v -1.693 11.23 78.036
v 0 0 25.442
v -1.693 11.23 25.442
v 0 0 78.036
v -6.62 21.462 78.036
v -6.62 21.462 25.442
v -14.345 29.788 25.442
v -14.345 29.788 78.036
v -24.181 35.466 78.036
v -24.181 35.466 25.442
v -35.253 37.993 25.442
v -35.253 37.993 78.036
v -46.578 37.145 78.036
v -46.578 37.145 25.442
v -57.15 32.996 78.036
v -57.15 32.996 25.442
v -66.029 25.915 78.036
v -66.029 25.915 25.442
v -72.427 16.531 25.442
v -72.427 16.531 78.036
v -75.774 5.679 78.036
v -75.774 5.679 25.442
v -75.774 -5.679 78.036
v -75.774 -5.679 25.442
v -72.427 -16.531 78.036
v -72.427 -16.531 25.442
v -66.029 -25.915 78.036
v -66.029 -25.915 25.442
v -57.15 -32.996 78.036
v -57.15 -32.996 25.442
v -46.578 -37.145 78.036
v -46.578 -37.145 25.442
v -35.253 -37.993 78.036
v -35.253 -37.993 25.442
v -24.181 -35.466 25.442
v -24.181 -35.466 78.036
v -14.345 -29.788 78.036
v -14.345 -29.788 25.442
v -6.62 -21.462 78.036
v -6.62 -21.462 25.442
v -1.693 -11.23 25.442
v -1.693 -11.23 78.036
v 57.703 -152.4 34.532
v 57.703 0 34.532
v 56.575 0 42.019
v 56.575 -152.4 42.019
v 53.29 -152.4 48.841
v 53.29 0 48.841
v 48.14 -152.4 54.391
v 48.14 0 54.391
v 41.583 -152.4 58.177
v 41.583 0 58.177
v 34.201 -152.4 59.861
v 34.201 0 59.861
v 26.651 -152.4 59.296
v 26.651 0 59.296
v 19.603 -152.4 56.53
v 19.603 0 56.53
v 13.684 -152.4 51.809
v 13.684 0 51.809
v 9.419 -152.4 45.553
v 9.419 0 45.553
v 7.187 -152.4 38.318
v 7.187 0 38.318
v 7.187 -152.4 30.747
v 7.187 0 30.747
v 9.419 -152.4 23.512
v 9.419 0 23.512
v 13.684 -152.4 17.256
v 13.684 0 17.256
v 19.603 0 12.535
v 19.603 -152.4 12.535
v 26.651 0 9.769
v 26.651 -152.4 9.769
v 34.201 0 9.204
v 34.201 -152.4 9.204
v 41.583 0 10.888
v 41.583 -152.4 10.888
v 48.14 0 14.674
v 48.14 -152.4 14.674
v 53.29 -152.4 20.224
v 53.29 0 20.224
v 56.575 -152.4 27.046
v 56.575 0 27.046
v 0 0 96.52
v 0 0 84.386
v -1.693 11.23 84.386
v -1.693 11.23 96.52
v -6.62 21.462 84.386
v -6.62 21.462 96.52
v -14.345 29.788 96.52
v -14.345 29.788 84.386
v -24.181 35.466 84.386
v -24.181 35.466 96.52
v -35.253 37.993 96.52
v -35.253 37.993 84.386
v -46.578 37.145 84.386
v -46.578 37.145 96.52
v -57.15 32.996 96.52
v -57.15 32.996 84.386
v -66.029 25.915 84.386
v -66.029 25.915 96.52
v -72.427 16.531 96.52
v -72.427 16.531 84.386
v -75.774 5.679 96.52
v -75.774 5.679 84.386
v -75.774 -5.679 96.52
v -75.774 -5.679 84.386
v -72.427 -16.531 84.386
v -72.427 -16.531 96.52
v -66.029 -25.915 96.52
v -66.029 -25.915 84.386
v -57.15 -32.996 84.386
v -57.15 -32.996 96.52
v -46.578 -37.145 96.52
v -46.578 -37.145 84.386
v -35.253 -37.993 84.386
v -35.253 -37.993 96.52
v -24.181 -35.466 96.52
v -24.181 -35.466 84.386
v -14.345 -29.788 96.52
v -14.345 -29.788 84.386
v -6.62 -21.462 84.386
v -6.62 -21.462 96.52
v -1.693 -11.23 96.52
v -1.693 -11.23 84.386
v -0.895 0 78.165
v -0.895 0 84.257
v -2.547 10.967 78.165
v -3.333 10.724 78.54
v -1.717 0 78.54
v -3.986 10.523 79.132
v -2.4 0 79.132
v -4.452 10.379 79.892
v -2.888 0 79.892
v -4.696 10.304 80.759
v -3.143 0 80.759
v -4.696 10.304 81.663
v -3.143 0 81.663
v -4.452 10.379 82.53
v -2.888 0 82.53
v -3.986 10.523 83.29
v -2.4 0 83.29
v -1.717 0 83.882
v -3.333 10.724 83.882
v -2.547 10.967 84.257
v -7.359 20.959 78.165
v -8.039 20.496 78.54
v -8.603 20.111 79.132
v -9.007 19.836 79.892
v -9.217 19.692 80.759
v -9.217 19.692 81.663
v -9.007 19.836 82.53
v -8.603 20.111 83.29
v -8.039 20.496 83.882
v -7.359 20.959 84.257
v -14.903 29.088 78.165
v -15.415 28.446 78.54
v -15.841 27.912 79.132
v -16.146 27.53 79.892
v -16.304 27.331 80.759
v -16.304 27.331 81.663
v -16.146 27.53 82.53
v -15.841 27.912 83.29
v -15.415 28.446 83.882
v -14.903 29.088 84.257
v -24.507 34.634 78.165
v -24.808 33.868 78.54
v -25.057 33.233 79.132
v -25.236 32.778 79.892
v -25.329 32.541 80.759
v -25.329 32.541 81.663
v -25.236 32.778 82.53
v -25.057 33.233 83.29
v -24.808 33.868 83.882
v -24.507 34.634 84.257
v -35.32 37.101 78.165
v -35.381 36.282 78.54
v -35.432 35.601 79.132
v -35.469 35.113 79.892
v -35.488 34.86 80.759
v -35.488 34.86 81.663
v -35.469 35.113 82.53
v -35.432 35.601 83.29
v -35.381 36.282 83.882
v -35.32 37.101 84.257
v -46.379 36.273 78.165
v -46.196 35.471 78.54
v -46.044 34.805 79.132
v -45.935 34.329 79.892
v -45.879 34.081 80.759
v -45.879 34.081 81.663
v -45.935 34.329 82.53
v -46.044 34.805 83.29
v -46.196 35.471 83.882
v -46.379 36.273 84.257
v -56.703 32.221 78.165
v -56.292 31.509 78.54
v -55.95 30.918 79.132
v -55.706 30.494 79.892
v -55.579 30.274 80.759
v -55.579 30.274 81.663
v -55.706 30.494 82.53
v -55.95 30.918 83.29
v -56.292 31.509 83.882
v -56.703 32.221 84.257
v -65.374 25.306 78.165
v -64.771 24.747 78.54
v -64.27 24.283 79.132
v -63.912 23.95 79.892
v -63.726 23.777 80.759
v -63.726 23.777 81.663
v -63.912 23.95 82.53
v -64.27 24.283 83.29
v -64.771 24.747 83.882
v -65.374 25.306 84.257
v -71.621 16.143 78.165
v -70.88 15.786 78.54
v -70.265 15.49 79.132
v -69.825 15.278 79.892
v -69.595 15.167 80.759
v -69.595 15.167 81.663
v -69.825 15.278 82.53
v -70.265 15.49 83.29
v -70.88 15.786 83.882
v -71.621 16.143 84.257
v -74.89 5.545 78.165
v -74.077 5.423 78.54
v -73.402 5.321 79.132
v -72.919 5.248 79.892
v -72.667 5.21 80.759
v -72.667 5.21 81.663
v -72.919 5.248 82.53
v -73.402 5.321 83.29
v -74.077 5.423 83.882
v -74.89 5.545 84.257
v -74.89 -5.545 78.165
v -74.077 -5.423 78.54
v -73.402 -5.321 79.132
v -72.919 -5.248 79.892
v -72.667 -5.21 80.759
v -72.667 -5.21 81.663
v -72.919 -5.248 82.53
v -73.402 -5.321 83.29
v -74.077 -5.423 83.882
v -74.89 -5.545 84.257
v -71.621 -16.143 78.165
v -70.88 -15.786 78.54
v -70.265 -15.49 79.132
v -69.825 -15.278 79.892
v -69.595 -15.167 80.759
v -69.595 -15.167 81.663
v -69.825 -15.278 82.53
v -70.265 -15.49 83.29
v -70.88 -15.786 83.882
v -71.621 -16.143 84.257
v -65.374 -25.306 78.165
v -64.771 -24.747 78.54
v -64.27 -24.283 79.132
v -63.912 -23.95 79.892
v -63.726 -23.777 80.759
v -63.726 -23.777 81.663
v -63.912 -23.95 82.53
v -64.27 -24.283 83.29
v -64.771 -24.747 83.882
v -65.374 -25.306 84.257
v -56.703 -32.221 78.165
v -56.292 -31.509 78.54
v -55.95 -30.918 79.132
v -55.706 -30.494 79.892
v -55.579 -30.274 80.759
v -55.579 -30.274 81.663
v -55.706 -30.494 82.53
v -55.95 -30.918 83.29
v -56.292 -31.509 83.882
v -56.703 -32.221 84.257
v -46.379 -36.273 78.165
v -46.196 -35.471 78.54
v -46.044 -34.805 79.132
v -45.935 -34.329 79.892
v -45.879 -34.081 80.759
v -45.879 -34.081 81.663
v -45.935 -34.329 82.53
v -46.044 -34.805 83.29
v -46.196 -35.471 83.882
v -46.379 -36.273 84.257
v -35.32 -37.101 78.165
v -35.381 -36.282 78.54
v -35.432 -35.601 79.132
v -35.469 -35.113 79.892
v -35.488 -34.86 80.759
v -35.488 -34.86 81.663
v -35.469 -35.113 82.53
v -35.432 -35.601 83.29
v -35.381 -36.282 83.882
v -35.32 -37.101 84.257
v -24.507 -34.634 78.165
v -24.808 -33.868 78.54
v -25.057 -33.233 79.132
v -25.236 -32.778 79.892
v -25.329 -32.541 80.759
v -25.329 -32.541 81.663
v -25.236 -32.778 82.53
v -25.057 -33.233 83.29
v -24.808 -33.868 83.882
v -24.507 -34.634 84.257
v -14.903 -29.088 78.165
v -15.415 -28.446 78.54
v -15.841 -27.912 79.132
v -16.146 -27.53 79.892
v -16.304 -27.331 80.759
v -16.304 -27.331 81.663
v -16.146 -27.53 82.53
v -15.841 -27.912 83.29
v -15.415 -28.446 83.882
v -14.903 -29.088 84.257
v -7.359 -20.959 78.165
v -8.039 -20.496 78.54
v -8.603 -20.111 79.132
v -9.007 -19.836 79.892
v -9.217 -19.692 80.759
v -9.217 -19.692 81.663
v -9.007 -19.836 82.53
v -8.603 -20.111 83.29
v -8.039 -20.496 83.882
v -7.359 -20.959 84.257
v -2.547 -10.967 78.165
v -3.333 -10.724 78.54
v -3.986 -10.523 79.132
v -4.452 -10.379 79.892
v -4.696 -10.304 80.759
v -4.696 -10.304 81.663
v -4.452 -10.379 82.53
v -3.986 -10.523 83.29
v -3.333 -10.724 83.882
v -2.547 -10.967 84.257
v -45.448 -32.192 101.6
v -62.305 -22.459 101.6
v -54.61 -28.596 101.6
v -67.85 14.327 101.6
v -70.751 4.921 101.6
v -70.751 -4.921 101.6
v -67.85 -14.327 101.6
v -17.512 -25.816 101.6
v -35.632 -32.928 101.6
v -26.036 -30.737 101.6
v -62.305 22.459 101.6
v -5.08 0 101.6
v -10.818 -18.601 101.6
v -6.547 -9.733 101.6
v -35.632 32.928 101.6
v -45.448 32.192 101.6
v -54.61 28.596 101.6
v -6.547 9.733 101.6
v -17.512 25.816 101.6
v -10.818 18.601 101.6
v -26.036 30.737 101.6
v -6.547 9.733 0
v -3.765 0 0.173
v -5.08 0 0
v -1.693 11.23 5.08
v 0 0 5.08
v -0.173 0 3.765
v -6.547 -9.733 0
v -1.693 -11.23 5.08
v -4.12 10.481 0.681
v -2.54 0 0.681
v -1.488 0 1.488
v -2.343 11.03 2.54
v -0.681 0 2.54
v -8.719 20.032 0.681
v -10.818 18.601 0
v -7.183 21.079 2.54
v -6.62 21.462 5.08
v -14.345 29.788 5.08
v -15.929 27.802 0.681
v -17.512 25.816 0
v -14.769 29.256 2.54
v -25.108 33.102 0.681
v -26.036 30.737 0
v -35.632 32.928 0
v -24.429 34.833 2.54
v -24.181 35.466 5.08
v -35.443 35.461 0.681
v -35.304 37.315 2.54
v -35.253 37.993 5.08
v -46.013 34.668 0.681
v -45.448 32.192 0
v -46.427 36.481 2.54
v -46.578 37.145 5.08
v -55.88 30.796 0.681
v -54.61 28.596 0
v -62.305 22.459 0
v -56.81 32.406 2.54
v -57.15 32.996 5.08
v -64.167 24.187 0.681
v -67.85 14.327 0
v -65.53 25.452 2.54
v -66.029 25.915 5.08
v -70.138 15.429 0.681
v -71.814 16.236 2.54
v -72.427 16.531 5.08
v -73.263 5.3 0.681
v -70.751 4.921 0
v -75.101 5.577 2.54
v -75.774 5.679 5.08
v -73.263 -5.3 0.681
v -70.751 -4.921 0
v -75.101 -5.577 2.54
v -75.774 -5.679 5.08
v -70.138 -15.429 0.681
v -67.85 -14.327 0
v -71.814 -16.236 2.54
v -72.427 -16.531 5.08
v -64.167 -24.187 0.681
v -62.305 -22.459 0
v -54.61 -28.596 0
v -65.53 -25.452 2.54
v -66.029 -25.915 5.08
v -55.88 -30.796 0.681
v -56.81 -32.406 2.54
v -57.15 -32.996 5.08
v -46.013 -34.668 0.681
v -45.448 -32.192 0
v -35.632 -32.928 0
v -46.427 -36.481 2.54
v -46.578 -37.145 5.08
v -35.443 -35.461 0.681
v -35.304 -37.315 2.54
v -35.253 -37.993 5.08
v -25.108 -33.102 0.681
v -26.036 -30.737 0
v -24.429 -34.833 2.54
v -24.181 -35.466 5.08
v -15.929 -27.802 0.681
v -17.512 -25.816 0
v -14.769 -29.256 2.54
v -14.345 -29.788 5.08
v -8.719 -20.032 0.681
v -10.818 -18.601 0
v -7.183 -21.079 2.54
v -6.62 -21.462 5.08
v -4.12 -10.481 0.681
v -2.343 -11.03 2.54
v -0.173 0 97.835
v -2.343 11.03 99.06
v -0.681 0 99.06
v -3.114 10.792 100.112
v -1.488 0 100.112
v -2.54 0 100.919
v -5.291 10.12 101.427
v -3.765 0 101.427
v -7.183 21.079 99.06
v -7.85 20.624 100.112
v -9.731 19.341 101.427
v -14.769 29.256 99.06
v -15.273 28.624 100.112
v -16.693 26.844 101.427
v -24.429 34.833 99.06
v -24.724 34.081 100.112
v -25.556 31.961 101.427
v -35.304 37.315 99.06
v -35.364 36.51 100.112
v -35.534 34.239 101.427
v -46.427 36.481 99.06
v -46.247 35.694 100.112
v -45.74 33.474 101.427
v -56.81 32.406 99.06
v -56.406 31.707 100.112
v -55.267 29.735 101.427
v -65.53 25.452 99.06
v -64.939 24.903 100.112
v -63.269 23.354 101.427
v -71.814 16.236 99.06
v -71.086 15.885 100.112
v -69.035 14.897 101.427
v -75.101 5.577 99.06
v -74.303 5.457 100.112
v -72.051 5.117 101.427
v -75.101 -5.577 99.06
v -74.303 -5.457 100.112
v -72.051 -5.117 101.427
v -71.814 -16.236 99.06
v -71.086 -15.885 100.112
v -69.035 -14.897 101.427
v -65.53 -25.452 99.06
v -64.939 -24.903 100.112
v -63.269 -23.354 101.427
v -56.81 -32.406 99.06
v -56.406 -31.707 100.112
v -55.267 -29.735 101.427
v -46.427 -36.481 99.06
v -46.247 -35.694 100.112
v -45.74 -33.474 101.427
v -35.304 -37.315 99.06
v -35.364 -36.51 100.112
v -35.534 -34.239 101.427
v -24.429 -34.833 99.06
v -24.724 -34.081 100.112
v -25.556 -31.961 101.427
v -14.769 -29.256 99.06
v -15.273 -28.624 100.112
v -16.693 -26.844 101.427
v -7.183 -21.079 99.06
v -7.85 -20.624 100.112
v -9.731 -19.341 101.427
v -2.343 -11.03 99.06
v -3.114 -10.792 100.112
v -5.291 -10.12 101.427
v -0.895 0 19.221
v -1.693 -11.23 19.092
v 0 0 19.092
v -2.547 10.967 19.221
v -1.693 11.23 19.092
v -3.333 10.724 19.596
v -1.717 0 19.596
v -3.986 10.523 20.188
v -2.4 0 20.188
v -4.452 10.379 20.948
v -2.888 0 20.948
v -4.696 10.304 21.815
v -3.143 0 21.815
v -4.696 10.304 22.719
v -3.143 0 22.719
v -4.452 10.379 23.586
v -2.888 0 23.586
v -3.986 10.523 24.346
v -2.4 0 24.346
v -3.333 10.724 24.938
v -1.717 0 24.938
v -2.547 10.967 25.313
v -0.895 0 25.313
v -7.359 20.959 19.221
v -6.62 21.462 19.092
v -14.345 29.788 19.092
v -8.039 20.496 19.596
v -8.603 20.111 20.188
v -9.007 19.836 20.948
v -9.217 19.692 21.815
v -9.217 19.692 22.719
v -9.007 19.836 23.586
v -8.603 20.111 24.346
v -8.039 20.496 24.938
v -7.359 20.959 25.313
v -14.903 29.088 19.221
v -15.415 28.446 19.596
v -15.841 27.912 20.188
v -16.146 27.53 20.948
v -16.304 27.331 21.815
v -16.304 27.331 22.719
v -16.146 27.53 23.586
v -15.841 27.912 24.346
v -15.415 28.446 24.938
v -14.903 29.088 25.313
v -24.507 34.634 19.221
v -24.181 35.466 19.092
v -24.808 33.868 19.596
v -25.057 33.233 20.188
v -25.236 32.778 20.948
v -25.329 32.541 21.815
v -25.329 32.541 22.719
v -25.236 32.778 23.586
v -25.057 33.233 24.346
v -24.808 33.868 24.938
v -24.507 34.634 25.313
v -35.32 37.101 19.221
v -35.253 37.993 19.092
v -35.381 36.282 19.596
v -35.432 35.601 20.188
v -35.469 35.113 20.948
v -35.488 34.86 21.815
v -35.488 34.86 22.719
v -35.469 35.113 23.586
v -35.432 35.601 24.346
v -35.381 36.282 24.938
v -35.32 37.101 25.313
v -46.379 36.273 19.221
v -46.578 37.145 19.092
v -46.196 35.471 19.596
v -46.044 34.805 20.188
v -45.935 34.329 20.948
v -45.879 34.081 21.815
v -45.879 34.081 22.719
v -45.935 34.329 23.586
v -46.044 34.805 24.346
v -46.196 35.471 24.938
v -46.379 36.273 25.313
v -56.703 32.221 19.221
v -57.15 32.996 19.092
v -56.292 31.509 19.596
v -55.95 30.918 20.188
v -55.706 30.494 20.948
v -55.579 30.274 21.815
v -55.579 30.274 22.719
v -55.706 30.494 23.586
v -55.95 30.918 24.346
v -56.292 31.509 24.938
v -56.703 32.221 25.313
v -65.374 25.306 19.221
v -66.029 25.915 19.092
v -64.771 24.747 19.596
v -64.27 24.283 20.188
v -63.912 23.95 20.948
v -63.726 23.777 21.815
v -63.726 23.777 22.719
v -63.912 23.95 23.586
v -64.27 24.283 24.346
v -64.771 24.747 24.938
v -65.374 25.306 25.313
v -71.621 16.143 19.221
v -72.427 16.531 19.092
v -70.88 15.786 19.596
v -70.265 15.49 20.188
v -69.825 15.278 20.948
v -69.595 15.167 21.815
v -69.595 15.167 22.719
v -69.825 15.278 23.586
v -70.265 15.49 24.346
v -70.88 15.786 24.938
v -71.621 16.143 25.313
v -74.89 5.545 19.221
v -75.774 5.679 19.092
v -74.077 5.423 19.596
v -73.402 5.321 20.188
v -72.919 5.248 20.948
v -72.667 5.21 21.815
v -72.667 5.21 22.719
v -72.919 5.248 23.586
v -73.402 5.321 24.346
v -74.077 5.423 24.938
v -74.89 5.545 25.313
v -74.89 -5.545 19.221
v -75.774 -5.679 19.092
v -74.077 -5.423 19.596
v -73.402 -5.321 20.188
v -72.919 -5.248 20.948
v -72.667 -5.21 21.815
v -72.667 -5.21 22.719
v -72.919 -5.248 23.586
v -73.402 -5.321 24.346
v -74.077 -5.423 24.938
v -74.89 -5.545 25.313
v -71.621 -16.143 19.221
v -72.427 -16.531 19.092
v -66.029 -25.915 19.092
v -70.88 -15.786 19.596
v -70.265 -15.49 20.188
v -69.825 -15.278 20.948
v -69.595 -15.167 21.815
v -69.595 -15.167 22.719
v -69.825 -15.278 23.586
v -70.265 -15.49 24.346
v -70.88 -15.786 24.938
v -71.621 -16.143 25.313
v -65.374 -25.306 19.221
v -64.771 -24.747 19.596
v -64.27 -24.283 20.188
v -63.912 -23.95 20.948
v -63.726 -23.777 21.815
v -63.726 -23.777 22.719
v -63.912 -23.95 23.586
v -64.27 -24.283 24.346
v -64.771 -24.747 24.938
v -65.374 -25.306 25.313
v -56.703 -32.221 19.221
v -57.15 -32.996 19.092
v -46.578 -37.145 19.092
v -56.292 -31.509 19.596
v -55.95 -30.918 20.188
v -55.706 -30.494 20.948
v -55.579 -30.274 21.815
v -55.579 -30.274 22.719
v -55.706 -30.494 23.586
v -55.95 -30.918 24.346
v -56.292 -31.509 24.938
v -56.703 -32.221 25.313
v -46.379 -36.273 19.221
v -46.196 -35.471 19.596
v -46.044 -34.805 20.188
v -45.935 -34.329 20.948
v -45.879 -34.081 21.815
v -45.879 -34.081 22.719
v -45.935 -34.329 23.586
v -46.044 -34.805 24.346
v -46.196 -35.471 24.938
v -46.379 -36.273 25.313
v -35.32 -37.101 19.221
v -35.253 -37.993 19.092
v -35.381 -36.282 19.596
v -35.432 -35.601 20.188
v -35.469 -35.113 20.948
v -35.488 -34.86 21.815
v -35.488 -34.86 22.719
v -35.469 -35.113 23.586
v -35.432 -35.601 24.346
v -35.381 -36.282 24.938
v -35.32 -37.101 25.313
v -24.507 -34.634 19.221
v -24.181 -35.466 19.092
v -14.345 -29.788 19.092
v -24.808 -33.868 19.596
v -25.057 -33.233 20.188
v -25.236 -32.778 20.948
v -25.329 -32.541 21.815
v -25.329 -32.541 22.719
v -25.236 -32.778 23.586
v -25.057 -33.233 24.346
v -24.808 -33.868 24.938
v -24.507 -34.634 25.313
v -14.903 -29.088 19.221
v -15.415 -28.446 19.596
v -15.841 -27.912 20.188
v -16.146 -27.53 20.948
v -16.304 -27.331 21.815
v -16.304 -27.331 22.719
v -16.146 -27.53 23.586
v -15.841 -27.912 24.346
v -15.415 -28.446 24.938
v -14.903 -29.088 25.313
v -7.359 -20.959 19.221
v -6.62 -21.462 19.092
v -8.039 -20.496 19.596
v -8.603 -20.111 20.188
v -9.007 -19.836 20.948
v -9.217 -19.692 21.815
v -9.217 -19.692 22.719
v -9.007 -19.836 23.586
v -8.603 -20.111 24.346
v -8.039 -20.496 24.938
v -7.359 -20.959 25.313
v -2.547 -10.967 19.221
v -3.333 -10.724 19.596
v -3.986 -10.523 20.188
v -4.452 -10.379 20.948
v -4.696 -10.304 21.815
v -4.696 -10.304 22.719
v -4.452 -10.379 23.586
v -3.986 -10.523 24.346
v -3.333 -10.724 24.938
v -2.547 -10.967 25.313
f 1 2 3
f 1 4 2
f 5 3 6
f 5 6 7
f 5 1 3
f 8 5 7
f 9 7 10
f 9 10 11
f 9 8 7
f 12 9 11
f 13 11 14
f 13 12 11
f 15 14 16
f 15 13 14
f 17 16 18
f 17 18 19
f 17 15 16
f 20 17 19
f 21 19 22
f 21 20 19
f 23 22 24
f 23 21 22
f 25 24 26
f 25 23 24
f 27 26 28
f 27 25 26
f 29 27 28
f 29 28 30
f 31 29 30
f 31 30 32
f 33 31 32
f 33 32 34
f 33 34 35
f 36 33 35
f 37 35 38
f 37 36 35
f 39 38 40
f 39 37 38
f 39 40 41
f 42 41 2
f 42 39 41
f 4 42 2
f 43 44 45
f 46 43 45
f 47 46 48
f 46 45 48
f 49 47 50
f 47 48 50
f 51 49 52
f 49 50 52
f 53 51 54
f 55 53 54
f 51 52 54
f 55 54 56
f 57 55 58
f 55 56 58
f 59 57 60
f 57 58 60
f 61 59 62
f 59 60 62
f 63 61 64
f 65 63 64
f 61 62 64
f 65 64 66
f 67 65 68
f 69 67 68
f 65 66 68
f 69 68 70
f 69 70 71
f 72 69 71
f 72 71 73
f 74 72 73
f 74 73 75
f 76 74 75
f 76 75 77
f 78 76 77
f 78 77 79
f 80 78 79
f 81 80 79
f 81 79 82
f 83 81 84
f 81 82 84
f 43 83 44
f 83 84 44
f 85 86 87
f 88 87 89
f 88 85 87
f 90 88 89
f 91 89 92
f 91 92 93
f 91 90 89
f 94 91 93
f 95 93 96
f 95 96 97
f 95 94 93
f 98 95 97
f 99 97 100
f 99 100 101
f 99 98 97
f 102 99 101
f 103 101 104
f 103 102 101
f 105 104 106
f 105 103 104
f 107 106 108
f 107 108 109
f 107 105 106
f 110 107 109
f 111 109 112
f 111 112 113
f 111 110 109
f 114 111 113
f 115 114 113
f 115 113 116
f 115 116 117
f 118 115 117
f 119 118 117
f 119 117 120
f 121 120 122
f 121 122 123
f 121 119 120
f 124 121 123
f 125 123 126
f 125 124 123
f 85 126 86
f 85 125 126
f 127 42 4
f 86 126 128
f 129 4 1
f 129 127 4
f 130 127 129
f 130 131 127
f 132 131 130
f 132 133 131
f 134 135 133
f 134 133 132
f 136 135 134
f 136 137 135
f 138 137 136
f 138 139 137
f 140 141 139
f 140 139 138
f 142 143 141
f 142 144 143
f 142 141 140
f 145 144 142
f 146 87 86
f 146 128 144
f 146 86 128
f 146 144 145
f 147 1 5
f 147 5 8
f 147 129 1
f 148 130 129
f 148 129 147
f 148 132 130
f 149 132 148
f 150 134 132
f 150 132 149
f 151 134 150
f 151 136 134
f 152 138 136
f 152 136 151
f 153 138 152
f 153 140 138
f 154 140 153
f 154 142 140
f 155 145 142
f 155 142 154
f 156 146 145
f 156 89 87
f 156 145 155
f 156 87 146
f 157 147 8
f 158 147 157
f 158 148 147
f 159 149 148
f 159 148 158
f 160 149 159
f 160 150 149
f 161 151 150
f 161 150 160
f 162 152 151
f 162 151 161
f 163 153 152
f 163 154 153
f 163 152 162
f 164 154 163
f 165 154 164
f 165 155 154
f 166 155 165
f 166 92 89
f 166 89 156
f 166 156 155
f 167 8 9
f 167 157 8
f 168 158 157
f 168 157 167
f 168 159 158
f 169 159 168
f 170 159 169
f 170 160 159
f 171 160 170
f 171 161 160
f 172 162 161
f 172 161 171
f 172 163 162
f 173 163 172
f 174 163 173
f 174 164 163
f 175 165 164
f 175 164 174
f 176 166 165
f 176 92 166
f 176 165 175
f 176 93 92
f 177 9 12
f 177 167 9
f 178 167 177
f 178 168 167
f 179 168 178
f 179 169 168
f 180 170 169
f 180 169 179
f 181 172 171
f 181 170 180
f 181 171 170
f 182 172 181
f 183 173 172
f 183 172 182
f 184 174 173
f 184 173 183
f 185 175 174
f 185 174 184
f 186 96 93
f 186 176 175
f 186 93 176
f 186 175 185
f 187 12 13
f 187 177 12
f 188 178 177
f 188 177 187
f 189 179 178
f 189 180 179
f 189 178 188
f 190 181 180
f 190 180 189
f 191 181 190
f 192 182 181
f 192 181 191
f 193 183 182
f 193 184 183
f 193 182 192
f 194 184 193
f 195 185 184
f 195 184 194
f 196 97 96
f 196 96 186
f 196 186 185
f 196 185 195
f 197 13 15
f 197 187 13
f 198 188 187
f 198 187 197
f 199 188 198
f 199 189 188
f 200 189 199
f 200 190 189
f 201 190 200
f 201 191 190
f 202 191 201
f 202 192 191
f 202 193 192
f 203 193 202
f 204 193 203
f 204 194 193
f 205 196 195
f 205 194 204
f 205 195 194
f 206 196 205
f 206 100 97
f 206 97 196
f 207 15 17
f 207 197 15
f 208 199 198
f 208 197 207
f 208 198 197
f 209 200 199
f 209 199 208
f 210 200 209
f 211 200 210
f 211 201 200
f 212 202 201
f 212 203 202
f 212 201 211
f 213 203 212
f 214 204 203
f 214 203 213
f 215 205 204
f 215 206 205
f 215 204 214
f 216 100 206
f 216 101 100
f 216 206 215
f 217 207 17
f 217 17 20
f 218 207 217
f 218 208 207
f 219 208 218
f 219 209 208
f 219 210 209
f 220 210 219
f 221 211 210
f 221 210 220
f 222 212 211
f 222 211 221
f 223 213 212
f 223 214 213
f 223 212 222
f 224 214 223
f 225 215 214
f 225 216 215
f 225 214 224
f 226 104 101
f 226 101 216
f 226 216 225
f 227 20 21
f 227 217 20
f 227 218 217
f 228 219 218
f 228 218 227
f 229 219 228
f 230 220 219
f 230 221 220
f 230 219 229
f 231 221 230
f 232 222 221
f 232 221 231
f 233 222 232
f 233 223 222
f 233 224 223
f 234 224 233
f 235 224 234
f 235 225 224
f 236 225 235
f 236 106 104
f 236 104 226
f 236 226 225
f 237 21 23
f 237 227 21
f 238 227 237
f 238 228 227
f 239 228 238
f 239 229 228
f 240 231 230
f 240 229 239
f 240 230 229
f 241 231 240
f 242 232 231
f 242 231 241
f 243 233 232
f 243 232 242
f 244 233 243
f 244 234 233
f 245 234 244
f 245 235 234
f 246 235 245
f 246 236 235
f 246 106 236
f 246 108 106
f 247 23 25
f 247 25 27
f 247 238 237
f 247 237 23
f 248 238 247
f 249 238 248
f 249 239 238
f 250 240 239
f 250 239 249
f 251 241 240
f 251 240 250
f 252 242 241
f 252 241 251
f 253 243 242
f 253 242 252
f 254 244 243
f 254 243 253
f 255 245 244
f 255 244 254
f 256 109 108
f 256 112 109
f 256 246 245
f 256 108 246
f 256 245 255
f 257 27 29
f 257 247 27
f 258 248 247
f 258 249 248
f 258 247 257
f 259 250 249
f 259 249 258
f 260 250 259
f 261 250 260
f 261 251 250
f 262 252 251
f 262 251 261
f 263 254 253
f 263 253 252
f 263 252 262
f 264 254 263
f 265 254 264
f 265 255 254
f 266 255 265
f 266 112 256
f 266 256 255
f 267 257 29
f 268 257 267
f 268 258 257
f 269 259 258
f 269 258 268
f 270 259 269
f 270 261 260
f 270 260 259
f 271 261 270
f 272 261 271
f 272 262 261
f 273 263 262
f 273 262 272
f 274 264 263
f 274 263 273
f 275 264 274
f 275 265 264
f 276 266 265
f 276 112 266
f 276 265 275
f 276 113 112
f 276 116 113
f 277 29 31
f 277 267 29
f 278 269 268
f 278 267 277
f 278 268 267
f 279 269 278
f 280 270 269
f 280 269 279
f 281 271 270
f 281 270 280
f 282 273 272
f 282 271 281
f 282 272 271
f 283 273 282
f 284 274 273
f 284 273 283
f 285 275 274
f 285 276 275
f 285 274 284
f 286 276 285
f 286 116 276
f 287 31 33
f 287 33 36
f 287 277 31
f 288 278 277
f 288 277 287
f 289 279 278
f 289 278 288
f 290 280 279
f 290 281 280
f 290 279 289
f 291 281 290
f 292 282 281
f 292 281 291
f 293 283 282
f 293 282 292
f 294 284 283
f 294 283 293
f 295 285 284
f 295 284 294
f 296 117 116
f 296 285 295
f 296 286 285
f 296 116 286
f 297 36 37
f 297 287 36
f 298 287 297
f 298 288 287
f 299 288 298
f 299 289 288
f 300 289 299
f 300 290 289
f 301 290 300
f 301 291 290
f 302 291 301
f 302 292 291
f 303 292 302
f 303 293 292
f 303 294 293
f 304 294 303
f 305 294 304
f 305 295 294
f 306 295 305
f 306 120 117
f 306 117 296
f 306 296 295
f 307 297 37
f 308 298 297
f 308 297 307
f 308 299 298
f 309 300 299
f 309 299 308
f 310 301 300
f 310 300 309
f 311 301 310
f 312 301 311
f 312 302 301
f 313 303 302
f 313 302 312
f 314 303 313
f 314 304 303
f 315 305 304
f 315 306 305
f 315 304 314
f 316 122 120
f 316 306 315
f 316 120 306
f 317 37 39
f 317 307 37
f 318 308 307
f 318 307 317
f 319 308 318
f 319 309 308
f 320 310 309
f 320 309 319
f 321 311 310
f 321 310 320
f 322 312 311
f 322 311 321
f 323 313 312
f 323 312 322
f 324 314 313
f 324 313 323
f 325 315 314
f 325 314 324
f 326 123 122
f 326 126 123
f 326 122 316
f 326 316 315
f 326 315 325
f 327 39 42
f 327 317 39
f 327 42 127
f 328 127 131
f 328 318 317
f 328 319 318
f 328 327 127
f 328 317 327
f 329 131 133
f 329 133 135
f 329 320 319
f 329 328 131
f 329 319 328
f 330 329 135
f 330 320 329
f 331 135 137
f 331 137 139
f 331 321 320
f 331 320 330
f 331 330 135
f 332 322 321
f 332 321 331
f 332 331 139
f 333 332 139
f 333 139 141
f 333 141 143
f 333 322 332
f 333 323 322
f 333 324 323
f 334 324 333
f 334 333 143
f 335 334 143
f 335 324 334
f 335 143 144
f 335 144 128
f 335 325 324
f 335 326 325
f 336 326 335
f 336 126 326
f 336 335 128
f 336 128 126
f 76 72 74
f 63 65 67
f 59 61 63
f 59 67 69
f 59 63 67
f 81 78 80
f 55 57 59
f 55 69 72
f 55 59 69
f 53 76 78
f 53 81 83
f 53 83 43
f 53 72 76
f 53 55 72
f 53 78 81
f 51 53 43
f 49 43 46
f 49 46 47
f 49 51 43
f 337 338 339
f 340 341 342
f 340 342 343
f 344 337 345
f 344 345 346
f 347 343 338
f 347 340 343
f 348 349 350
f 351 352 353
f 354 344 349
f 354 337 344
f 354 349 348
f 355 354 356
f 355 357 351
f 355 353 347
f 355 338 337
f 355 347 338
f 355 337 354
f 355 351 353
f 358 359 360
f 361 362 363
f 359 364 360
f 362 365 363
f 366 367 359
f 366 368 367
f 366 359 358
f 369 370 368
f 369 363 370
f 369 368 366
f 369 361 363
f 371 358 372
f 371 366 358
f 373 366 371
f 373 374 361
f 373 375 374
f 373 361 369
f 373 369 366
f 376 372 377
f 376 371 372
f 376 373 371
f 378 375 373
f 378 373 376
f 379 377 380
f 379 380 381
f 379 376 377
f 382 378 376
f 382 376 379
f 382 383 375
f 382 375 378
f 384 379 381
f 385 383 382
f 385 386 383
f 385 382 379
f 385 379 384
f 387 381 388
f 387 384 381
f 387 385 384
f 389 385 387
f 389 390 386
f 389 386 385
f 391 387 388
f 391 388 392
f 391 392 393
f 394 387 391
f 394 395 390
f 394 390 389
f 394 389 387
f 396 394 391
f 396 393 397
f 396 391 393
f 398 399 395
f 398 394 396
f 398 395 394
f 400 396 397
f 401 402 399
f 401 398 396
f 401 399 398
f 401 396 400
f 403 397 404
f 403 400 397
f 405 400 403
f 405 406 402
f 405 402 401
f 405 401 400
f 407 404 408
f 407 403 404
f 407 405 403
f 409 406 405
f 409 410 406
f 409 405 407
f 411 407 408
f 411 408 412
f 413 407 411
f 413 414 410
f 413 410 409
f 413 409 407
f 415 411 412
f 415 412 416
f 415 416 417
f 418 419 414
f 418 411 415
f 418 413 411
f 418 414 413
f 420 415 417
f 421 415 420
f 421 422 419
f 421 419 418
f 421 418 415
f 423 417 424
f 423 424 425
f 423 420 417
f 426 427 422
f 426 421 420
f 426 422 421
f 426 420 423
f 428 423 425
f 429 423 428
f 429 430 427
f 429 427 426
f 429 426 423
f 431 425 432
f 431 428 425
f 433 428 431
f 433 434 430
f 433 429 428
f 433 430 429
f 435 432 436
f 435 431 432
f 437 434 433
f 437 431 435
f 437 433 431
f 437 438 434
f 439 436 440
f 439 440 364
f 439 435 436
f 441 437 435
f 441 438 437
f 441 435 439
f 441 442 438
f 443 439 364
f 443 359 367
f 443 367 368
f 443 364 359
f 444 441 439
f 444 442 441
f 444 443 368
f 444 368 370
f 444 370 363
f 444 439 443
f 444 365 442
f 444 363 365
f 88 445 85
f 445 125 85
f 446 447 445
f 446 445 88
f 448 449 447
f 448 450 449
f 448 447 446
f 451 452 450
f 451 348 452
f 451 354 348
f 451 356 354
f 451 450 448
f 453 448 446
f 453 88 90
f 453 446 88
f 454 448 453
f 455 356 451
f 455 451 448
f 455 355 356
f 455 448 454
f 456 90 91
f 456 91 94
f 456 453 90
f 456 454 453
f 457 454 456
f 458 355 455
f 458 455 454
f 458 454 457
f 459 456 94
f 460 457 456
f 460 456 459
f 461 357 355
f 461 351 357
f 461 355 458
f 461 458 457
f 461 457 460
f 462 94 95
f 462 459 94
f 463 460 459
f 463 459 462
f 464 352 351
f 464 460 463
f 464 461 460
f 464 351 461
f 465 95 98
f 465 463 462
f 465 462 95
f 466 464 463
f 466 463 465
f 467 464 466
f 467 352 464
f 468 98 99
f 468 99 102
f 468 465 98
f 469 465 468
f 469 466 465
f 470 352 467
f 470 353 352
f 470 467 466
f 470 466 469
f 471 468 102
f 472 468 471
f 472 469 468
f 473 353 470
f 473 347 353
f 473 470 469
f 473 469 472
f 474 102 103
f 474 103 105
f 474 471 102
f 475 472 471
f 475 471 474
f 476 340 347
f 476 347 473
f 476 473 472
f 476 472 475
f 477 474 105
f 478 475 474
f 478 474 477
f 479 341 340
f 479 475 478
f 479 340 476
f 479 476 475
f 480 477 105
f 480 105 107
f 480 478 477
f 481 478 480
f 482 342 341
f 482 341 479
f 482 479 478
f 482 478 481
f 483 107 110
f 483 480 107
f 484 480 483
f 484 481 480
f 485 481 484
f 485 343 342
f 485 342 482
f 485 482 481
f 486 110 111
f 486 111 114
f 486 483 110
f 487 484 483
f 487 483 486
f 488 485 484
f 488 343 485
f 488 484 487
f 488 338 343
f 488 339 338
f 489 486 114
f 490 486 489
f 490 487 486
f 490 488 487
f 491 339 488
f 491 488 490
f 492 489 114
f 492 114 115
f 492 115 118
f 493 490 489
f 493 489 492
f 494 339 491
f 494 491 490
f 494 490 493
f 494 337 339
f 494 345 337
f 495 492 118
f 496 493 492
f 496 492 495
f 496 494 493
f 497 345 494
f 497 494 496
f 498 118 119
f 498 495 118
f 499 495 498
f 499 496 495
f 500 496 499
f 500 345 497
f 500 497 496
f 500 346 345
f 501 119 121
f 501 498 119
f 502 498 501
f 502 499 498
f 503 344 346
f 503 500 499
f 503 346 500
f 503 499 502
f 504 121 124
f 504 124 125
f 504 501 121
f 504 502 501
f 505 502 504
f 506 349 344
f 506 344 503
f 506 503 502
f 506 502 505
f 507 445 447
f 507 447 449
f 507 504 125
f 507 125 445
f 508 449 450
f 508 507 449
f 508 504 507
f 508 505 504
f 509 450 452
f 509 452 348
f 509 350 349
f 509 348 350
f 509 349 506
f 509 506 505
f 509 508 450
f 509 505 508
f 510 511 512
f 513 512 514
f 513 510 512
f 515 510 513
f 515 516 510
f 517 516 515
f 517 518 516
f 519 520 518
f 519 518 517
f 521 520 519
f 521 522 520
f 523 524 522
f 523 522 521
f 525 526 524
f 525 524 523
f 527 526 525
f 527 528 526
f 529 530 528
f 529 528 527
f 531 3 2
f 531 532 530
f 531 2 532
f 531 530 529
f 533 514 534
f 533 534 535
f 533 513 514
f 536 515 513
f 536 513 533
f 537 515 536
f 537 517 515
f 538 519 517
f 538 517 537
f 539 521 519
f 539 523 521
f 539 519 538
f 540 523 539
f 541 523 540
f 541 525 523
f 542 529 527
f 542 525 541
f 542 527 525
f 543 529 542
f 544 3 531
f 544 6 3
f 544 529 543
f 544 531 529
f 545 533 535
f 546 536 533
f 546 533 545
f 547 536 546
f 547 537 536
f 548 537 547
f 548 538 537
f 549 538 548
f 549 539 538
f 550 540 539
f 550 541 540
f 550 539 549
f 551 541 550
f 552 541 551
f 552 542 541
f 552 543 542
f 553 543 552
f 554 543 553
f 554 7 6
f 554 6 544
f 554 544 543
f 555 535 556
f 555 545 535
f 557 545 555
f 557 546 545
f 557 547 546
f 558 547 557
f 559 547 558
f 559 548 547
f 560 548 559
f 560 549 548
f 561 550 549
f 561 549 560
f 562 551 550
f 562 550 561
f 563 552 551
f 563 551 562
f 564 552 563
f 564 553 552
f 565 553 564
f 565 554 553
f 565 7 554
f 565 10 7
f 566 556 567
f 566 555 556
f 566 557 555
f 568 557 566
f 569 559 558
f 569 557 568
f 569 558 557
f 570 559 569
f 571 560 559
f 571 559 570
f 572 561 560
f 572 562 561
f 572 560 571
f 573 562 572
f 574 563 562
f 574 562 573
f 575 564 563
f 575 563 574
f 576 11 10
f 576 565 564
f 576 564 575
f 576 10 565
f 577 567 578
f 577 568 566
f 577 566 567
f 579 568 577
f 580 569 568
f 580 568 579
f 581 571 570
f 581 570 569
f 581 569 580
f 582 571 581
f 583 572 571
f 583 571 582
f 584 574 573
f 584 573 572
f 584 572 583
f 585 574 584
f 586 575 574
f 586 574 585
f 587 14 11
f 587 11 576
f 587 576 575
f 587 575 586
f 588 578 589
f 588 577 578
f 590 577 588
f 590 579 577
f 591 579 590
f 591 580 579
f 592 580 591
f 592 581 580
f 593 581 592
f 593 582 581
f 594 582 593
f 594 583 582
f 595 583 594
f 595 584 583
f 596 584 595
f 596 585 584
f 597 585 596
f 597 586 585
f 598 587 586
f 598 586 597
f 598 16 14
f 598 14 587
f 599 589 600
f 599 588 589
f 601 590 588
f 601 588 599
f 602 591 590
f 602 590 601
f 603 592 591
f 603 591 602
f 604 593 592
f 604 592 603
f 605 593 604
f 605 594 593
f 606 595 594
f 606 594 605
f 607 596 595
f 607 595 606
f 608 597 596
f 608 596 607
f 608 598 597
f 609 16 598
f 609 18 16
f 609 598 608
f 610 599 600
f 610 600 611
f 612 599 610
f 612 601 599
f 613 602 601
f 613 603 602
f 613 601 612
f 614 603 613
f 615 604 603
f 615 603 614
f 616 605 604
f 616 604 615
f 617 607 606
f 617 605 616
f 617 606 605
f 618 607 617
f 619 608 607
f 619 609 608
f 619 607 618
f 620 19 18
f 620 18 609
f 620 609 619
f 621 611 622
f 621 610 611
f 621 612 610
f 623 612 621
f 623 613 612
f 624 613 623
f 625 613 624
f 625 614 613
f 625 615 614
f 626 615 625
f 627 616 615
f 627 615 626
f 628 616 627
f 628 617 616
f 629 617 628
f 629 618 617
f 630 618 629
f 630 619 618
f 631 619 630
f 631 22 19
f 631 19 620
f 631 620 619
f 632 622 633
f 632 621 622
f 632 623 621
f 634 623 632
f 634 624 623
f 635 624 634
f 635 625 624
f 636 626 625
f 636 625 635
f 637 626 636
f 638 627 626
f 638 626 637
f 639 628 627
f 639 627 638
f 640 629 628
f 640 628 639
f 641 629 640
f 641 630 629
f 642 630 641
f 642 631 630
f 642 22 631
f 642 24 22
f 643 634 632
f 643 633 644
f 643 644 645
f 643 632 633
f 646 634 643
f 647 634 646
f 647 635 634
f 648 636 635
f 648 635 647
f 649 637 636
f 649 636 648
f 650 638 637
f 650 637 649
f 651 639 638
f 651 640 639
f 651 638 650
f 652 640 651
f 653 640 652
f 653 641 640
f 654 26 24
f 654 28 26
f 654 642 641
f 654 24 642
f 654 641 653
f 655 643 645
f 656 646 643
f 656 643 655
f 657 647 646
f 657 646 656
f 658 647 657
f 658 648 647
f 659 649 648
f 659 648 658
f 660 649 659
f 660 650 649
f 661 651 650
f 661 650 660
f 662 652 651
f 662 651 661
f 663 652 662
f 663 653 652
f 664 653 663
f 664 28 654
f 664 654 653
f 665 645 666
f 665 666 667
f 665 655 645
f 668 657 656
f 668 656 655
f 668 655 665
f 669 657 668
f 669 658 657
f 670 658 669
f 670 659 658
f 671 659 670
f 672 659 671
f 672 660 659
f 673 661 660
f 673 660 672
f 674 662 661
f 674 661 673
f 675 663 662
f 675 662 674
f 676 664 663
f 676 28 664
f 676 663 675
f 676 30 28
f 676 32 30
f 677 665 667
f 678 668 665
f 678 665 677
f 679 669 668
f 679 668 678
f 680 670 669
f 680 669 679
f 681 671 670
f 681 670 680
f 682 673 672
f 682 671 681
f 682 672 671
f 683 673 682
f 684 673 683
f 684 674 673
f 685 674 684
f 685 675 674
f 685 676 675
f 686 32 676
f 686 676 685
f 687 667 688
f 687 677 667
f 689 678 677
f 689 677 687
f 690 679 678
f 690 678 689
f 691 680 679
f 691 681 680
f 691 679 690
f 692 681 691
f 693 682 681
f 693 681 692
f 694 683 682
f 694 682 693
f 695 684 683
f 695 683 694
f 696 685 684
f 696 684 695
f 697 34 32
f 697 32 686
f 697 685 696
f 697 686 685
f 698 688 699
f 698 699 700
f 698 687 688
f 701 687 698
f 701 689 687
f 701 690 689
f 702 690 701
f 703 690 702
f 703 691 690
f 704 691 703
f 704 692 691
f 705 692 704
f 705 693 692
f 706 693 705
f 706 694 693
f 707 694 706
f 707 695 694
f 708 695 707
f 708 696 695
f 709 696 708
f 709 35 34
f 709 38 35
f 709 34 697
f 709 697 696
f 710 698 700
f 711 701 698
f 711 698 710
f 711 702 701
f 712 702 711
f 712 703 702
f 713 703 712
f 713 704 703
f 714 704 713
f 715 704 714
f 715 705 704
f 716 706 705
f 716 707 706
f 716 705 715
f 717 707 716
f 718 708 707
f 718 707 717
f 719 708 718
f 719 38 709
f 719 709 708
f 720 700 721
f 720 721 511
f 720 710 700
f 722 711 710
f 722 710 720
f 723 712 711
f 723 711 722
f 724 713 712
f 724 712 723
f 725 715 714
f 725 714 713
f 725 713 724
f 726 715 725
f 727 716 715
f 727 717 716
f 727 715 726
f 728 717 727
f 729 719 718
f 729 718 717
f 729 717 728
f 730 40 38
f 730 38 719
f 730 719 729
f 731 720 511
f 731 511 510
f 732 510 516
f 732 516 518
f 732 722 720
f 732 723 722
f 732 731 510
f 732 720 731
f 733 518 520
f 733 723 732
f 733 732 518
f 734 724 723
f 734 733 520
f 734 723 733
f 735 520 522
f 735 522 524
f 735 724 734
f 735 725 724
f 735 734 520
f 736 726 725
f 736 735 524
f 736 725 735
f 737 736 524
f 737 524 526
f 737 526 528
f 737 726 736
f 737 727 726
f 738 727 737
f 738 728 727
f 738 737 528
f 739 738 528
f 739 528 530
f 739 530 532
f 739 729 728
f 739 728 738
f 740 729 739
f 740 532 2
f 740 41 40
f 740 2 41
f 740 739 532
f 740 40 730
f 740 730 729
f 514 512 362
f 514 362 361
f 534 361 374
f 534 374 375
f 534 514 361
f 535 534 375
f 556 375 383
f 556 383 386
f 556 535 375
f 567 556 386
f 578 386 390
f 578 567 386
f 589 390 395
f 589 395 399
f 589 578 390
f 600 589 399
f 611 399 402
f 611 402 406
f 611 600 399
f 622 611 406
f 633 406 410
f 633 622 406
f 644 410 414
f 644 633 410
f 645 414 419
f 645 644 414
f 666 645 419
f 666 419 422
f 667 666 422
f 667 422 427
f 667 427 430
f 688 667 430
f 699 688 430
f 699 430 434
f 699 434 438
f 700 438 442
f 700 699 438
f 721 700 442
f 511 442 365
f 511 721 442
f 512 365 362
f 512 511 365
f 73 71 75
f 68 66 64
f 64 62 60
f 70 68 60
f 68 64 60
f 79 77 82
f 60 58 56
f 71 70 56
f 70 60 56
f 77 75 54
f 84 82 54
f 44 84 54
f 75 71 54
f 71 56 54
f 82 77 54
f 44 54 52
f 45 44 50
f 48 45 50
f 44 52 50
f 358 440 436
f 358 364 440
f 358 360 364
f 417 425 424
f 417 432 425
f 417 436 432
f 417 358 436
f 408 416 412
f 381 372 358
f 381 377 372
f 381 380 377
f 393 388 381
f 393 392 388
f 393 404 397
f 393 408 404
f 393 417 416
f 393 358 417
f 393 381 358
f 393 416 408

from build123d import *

# Parameters (mm, degrees)
F2_R     = 5.08
F3_R     = 25.4
F4_DEPTH = 152.4


with BuildPart() as f1:
    # F0 (on Front) → F1 (revolve)
    with BuildSketch(Plane.XZ):
        with BuildLine():
            Line((-38.1, 0), (0, 0))
            Line((0, 0), (0, 19.0920137882))
            ThreePointArc((0, 19.0920137882), (-3.175, 22.2670137882), (0, 25.4420137882))
            Line((0, 25.4420137882), (0, 78.0360230327))
            ThreePointArc((0, 78.0360230327), (-3.175, 81.2110230327), (0, 84.3860230327))
            Line((0, 84.3860230327), (0, 101.6))
            Line((0, 101.6), (-38.1, 101.6))
            Line((-38.1, 101.6), (-38.1, 0))
        make_face()
    revolve(axis=Axis((-38.1, 0, 50.8), (0, 0, 1)))

    # F2
    f2_edges = [f1.edges().sort_by_distance(p)[0] for p in [
        (-76.2, 0, 101.6),
        (-76.2, 0, 0),
    ]]
    fillet(f2_edges, radius=F2_R)


with BuildPart() as f4:
    # F3 (on Front) → F4 (new body)
    with BuildSketch(Plane.XZ):
        with Locations((32.3031619191, 34.5324799418)):
            Circle(F3_R)
    extrude(amount=F4_DEPTH)


solid = Compound([f1.part, f4.part])
